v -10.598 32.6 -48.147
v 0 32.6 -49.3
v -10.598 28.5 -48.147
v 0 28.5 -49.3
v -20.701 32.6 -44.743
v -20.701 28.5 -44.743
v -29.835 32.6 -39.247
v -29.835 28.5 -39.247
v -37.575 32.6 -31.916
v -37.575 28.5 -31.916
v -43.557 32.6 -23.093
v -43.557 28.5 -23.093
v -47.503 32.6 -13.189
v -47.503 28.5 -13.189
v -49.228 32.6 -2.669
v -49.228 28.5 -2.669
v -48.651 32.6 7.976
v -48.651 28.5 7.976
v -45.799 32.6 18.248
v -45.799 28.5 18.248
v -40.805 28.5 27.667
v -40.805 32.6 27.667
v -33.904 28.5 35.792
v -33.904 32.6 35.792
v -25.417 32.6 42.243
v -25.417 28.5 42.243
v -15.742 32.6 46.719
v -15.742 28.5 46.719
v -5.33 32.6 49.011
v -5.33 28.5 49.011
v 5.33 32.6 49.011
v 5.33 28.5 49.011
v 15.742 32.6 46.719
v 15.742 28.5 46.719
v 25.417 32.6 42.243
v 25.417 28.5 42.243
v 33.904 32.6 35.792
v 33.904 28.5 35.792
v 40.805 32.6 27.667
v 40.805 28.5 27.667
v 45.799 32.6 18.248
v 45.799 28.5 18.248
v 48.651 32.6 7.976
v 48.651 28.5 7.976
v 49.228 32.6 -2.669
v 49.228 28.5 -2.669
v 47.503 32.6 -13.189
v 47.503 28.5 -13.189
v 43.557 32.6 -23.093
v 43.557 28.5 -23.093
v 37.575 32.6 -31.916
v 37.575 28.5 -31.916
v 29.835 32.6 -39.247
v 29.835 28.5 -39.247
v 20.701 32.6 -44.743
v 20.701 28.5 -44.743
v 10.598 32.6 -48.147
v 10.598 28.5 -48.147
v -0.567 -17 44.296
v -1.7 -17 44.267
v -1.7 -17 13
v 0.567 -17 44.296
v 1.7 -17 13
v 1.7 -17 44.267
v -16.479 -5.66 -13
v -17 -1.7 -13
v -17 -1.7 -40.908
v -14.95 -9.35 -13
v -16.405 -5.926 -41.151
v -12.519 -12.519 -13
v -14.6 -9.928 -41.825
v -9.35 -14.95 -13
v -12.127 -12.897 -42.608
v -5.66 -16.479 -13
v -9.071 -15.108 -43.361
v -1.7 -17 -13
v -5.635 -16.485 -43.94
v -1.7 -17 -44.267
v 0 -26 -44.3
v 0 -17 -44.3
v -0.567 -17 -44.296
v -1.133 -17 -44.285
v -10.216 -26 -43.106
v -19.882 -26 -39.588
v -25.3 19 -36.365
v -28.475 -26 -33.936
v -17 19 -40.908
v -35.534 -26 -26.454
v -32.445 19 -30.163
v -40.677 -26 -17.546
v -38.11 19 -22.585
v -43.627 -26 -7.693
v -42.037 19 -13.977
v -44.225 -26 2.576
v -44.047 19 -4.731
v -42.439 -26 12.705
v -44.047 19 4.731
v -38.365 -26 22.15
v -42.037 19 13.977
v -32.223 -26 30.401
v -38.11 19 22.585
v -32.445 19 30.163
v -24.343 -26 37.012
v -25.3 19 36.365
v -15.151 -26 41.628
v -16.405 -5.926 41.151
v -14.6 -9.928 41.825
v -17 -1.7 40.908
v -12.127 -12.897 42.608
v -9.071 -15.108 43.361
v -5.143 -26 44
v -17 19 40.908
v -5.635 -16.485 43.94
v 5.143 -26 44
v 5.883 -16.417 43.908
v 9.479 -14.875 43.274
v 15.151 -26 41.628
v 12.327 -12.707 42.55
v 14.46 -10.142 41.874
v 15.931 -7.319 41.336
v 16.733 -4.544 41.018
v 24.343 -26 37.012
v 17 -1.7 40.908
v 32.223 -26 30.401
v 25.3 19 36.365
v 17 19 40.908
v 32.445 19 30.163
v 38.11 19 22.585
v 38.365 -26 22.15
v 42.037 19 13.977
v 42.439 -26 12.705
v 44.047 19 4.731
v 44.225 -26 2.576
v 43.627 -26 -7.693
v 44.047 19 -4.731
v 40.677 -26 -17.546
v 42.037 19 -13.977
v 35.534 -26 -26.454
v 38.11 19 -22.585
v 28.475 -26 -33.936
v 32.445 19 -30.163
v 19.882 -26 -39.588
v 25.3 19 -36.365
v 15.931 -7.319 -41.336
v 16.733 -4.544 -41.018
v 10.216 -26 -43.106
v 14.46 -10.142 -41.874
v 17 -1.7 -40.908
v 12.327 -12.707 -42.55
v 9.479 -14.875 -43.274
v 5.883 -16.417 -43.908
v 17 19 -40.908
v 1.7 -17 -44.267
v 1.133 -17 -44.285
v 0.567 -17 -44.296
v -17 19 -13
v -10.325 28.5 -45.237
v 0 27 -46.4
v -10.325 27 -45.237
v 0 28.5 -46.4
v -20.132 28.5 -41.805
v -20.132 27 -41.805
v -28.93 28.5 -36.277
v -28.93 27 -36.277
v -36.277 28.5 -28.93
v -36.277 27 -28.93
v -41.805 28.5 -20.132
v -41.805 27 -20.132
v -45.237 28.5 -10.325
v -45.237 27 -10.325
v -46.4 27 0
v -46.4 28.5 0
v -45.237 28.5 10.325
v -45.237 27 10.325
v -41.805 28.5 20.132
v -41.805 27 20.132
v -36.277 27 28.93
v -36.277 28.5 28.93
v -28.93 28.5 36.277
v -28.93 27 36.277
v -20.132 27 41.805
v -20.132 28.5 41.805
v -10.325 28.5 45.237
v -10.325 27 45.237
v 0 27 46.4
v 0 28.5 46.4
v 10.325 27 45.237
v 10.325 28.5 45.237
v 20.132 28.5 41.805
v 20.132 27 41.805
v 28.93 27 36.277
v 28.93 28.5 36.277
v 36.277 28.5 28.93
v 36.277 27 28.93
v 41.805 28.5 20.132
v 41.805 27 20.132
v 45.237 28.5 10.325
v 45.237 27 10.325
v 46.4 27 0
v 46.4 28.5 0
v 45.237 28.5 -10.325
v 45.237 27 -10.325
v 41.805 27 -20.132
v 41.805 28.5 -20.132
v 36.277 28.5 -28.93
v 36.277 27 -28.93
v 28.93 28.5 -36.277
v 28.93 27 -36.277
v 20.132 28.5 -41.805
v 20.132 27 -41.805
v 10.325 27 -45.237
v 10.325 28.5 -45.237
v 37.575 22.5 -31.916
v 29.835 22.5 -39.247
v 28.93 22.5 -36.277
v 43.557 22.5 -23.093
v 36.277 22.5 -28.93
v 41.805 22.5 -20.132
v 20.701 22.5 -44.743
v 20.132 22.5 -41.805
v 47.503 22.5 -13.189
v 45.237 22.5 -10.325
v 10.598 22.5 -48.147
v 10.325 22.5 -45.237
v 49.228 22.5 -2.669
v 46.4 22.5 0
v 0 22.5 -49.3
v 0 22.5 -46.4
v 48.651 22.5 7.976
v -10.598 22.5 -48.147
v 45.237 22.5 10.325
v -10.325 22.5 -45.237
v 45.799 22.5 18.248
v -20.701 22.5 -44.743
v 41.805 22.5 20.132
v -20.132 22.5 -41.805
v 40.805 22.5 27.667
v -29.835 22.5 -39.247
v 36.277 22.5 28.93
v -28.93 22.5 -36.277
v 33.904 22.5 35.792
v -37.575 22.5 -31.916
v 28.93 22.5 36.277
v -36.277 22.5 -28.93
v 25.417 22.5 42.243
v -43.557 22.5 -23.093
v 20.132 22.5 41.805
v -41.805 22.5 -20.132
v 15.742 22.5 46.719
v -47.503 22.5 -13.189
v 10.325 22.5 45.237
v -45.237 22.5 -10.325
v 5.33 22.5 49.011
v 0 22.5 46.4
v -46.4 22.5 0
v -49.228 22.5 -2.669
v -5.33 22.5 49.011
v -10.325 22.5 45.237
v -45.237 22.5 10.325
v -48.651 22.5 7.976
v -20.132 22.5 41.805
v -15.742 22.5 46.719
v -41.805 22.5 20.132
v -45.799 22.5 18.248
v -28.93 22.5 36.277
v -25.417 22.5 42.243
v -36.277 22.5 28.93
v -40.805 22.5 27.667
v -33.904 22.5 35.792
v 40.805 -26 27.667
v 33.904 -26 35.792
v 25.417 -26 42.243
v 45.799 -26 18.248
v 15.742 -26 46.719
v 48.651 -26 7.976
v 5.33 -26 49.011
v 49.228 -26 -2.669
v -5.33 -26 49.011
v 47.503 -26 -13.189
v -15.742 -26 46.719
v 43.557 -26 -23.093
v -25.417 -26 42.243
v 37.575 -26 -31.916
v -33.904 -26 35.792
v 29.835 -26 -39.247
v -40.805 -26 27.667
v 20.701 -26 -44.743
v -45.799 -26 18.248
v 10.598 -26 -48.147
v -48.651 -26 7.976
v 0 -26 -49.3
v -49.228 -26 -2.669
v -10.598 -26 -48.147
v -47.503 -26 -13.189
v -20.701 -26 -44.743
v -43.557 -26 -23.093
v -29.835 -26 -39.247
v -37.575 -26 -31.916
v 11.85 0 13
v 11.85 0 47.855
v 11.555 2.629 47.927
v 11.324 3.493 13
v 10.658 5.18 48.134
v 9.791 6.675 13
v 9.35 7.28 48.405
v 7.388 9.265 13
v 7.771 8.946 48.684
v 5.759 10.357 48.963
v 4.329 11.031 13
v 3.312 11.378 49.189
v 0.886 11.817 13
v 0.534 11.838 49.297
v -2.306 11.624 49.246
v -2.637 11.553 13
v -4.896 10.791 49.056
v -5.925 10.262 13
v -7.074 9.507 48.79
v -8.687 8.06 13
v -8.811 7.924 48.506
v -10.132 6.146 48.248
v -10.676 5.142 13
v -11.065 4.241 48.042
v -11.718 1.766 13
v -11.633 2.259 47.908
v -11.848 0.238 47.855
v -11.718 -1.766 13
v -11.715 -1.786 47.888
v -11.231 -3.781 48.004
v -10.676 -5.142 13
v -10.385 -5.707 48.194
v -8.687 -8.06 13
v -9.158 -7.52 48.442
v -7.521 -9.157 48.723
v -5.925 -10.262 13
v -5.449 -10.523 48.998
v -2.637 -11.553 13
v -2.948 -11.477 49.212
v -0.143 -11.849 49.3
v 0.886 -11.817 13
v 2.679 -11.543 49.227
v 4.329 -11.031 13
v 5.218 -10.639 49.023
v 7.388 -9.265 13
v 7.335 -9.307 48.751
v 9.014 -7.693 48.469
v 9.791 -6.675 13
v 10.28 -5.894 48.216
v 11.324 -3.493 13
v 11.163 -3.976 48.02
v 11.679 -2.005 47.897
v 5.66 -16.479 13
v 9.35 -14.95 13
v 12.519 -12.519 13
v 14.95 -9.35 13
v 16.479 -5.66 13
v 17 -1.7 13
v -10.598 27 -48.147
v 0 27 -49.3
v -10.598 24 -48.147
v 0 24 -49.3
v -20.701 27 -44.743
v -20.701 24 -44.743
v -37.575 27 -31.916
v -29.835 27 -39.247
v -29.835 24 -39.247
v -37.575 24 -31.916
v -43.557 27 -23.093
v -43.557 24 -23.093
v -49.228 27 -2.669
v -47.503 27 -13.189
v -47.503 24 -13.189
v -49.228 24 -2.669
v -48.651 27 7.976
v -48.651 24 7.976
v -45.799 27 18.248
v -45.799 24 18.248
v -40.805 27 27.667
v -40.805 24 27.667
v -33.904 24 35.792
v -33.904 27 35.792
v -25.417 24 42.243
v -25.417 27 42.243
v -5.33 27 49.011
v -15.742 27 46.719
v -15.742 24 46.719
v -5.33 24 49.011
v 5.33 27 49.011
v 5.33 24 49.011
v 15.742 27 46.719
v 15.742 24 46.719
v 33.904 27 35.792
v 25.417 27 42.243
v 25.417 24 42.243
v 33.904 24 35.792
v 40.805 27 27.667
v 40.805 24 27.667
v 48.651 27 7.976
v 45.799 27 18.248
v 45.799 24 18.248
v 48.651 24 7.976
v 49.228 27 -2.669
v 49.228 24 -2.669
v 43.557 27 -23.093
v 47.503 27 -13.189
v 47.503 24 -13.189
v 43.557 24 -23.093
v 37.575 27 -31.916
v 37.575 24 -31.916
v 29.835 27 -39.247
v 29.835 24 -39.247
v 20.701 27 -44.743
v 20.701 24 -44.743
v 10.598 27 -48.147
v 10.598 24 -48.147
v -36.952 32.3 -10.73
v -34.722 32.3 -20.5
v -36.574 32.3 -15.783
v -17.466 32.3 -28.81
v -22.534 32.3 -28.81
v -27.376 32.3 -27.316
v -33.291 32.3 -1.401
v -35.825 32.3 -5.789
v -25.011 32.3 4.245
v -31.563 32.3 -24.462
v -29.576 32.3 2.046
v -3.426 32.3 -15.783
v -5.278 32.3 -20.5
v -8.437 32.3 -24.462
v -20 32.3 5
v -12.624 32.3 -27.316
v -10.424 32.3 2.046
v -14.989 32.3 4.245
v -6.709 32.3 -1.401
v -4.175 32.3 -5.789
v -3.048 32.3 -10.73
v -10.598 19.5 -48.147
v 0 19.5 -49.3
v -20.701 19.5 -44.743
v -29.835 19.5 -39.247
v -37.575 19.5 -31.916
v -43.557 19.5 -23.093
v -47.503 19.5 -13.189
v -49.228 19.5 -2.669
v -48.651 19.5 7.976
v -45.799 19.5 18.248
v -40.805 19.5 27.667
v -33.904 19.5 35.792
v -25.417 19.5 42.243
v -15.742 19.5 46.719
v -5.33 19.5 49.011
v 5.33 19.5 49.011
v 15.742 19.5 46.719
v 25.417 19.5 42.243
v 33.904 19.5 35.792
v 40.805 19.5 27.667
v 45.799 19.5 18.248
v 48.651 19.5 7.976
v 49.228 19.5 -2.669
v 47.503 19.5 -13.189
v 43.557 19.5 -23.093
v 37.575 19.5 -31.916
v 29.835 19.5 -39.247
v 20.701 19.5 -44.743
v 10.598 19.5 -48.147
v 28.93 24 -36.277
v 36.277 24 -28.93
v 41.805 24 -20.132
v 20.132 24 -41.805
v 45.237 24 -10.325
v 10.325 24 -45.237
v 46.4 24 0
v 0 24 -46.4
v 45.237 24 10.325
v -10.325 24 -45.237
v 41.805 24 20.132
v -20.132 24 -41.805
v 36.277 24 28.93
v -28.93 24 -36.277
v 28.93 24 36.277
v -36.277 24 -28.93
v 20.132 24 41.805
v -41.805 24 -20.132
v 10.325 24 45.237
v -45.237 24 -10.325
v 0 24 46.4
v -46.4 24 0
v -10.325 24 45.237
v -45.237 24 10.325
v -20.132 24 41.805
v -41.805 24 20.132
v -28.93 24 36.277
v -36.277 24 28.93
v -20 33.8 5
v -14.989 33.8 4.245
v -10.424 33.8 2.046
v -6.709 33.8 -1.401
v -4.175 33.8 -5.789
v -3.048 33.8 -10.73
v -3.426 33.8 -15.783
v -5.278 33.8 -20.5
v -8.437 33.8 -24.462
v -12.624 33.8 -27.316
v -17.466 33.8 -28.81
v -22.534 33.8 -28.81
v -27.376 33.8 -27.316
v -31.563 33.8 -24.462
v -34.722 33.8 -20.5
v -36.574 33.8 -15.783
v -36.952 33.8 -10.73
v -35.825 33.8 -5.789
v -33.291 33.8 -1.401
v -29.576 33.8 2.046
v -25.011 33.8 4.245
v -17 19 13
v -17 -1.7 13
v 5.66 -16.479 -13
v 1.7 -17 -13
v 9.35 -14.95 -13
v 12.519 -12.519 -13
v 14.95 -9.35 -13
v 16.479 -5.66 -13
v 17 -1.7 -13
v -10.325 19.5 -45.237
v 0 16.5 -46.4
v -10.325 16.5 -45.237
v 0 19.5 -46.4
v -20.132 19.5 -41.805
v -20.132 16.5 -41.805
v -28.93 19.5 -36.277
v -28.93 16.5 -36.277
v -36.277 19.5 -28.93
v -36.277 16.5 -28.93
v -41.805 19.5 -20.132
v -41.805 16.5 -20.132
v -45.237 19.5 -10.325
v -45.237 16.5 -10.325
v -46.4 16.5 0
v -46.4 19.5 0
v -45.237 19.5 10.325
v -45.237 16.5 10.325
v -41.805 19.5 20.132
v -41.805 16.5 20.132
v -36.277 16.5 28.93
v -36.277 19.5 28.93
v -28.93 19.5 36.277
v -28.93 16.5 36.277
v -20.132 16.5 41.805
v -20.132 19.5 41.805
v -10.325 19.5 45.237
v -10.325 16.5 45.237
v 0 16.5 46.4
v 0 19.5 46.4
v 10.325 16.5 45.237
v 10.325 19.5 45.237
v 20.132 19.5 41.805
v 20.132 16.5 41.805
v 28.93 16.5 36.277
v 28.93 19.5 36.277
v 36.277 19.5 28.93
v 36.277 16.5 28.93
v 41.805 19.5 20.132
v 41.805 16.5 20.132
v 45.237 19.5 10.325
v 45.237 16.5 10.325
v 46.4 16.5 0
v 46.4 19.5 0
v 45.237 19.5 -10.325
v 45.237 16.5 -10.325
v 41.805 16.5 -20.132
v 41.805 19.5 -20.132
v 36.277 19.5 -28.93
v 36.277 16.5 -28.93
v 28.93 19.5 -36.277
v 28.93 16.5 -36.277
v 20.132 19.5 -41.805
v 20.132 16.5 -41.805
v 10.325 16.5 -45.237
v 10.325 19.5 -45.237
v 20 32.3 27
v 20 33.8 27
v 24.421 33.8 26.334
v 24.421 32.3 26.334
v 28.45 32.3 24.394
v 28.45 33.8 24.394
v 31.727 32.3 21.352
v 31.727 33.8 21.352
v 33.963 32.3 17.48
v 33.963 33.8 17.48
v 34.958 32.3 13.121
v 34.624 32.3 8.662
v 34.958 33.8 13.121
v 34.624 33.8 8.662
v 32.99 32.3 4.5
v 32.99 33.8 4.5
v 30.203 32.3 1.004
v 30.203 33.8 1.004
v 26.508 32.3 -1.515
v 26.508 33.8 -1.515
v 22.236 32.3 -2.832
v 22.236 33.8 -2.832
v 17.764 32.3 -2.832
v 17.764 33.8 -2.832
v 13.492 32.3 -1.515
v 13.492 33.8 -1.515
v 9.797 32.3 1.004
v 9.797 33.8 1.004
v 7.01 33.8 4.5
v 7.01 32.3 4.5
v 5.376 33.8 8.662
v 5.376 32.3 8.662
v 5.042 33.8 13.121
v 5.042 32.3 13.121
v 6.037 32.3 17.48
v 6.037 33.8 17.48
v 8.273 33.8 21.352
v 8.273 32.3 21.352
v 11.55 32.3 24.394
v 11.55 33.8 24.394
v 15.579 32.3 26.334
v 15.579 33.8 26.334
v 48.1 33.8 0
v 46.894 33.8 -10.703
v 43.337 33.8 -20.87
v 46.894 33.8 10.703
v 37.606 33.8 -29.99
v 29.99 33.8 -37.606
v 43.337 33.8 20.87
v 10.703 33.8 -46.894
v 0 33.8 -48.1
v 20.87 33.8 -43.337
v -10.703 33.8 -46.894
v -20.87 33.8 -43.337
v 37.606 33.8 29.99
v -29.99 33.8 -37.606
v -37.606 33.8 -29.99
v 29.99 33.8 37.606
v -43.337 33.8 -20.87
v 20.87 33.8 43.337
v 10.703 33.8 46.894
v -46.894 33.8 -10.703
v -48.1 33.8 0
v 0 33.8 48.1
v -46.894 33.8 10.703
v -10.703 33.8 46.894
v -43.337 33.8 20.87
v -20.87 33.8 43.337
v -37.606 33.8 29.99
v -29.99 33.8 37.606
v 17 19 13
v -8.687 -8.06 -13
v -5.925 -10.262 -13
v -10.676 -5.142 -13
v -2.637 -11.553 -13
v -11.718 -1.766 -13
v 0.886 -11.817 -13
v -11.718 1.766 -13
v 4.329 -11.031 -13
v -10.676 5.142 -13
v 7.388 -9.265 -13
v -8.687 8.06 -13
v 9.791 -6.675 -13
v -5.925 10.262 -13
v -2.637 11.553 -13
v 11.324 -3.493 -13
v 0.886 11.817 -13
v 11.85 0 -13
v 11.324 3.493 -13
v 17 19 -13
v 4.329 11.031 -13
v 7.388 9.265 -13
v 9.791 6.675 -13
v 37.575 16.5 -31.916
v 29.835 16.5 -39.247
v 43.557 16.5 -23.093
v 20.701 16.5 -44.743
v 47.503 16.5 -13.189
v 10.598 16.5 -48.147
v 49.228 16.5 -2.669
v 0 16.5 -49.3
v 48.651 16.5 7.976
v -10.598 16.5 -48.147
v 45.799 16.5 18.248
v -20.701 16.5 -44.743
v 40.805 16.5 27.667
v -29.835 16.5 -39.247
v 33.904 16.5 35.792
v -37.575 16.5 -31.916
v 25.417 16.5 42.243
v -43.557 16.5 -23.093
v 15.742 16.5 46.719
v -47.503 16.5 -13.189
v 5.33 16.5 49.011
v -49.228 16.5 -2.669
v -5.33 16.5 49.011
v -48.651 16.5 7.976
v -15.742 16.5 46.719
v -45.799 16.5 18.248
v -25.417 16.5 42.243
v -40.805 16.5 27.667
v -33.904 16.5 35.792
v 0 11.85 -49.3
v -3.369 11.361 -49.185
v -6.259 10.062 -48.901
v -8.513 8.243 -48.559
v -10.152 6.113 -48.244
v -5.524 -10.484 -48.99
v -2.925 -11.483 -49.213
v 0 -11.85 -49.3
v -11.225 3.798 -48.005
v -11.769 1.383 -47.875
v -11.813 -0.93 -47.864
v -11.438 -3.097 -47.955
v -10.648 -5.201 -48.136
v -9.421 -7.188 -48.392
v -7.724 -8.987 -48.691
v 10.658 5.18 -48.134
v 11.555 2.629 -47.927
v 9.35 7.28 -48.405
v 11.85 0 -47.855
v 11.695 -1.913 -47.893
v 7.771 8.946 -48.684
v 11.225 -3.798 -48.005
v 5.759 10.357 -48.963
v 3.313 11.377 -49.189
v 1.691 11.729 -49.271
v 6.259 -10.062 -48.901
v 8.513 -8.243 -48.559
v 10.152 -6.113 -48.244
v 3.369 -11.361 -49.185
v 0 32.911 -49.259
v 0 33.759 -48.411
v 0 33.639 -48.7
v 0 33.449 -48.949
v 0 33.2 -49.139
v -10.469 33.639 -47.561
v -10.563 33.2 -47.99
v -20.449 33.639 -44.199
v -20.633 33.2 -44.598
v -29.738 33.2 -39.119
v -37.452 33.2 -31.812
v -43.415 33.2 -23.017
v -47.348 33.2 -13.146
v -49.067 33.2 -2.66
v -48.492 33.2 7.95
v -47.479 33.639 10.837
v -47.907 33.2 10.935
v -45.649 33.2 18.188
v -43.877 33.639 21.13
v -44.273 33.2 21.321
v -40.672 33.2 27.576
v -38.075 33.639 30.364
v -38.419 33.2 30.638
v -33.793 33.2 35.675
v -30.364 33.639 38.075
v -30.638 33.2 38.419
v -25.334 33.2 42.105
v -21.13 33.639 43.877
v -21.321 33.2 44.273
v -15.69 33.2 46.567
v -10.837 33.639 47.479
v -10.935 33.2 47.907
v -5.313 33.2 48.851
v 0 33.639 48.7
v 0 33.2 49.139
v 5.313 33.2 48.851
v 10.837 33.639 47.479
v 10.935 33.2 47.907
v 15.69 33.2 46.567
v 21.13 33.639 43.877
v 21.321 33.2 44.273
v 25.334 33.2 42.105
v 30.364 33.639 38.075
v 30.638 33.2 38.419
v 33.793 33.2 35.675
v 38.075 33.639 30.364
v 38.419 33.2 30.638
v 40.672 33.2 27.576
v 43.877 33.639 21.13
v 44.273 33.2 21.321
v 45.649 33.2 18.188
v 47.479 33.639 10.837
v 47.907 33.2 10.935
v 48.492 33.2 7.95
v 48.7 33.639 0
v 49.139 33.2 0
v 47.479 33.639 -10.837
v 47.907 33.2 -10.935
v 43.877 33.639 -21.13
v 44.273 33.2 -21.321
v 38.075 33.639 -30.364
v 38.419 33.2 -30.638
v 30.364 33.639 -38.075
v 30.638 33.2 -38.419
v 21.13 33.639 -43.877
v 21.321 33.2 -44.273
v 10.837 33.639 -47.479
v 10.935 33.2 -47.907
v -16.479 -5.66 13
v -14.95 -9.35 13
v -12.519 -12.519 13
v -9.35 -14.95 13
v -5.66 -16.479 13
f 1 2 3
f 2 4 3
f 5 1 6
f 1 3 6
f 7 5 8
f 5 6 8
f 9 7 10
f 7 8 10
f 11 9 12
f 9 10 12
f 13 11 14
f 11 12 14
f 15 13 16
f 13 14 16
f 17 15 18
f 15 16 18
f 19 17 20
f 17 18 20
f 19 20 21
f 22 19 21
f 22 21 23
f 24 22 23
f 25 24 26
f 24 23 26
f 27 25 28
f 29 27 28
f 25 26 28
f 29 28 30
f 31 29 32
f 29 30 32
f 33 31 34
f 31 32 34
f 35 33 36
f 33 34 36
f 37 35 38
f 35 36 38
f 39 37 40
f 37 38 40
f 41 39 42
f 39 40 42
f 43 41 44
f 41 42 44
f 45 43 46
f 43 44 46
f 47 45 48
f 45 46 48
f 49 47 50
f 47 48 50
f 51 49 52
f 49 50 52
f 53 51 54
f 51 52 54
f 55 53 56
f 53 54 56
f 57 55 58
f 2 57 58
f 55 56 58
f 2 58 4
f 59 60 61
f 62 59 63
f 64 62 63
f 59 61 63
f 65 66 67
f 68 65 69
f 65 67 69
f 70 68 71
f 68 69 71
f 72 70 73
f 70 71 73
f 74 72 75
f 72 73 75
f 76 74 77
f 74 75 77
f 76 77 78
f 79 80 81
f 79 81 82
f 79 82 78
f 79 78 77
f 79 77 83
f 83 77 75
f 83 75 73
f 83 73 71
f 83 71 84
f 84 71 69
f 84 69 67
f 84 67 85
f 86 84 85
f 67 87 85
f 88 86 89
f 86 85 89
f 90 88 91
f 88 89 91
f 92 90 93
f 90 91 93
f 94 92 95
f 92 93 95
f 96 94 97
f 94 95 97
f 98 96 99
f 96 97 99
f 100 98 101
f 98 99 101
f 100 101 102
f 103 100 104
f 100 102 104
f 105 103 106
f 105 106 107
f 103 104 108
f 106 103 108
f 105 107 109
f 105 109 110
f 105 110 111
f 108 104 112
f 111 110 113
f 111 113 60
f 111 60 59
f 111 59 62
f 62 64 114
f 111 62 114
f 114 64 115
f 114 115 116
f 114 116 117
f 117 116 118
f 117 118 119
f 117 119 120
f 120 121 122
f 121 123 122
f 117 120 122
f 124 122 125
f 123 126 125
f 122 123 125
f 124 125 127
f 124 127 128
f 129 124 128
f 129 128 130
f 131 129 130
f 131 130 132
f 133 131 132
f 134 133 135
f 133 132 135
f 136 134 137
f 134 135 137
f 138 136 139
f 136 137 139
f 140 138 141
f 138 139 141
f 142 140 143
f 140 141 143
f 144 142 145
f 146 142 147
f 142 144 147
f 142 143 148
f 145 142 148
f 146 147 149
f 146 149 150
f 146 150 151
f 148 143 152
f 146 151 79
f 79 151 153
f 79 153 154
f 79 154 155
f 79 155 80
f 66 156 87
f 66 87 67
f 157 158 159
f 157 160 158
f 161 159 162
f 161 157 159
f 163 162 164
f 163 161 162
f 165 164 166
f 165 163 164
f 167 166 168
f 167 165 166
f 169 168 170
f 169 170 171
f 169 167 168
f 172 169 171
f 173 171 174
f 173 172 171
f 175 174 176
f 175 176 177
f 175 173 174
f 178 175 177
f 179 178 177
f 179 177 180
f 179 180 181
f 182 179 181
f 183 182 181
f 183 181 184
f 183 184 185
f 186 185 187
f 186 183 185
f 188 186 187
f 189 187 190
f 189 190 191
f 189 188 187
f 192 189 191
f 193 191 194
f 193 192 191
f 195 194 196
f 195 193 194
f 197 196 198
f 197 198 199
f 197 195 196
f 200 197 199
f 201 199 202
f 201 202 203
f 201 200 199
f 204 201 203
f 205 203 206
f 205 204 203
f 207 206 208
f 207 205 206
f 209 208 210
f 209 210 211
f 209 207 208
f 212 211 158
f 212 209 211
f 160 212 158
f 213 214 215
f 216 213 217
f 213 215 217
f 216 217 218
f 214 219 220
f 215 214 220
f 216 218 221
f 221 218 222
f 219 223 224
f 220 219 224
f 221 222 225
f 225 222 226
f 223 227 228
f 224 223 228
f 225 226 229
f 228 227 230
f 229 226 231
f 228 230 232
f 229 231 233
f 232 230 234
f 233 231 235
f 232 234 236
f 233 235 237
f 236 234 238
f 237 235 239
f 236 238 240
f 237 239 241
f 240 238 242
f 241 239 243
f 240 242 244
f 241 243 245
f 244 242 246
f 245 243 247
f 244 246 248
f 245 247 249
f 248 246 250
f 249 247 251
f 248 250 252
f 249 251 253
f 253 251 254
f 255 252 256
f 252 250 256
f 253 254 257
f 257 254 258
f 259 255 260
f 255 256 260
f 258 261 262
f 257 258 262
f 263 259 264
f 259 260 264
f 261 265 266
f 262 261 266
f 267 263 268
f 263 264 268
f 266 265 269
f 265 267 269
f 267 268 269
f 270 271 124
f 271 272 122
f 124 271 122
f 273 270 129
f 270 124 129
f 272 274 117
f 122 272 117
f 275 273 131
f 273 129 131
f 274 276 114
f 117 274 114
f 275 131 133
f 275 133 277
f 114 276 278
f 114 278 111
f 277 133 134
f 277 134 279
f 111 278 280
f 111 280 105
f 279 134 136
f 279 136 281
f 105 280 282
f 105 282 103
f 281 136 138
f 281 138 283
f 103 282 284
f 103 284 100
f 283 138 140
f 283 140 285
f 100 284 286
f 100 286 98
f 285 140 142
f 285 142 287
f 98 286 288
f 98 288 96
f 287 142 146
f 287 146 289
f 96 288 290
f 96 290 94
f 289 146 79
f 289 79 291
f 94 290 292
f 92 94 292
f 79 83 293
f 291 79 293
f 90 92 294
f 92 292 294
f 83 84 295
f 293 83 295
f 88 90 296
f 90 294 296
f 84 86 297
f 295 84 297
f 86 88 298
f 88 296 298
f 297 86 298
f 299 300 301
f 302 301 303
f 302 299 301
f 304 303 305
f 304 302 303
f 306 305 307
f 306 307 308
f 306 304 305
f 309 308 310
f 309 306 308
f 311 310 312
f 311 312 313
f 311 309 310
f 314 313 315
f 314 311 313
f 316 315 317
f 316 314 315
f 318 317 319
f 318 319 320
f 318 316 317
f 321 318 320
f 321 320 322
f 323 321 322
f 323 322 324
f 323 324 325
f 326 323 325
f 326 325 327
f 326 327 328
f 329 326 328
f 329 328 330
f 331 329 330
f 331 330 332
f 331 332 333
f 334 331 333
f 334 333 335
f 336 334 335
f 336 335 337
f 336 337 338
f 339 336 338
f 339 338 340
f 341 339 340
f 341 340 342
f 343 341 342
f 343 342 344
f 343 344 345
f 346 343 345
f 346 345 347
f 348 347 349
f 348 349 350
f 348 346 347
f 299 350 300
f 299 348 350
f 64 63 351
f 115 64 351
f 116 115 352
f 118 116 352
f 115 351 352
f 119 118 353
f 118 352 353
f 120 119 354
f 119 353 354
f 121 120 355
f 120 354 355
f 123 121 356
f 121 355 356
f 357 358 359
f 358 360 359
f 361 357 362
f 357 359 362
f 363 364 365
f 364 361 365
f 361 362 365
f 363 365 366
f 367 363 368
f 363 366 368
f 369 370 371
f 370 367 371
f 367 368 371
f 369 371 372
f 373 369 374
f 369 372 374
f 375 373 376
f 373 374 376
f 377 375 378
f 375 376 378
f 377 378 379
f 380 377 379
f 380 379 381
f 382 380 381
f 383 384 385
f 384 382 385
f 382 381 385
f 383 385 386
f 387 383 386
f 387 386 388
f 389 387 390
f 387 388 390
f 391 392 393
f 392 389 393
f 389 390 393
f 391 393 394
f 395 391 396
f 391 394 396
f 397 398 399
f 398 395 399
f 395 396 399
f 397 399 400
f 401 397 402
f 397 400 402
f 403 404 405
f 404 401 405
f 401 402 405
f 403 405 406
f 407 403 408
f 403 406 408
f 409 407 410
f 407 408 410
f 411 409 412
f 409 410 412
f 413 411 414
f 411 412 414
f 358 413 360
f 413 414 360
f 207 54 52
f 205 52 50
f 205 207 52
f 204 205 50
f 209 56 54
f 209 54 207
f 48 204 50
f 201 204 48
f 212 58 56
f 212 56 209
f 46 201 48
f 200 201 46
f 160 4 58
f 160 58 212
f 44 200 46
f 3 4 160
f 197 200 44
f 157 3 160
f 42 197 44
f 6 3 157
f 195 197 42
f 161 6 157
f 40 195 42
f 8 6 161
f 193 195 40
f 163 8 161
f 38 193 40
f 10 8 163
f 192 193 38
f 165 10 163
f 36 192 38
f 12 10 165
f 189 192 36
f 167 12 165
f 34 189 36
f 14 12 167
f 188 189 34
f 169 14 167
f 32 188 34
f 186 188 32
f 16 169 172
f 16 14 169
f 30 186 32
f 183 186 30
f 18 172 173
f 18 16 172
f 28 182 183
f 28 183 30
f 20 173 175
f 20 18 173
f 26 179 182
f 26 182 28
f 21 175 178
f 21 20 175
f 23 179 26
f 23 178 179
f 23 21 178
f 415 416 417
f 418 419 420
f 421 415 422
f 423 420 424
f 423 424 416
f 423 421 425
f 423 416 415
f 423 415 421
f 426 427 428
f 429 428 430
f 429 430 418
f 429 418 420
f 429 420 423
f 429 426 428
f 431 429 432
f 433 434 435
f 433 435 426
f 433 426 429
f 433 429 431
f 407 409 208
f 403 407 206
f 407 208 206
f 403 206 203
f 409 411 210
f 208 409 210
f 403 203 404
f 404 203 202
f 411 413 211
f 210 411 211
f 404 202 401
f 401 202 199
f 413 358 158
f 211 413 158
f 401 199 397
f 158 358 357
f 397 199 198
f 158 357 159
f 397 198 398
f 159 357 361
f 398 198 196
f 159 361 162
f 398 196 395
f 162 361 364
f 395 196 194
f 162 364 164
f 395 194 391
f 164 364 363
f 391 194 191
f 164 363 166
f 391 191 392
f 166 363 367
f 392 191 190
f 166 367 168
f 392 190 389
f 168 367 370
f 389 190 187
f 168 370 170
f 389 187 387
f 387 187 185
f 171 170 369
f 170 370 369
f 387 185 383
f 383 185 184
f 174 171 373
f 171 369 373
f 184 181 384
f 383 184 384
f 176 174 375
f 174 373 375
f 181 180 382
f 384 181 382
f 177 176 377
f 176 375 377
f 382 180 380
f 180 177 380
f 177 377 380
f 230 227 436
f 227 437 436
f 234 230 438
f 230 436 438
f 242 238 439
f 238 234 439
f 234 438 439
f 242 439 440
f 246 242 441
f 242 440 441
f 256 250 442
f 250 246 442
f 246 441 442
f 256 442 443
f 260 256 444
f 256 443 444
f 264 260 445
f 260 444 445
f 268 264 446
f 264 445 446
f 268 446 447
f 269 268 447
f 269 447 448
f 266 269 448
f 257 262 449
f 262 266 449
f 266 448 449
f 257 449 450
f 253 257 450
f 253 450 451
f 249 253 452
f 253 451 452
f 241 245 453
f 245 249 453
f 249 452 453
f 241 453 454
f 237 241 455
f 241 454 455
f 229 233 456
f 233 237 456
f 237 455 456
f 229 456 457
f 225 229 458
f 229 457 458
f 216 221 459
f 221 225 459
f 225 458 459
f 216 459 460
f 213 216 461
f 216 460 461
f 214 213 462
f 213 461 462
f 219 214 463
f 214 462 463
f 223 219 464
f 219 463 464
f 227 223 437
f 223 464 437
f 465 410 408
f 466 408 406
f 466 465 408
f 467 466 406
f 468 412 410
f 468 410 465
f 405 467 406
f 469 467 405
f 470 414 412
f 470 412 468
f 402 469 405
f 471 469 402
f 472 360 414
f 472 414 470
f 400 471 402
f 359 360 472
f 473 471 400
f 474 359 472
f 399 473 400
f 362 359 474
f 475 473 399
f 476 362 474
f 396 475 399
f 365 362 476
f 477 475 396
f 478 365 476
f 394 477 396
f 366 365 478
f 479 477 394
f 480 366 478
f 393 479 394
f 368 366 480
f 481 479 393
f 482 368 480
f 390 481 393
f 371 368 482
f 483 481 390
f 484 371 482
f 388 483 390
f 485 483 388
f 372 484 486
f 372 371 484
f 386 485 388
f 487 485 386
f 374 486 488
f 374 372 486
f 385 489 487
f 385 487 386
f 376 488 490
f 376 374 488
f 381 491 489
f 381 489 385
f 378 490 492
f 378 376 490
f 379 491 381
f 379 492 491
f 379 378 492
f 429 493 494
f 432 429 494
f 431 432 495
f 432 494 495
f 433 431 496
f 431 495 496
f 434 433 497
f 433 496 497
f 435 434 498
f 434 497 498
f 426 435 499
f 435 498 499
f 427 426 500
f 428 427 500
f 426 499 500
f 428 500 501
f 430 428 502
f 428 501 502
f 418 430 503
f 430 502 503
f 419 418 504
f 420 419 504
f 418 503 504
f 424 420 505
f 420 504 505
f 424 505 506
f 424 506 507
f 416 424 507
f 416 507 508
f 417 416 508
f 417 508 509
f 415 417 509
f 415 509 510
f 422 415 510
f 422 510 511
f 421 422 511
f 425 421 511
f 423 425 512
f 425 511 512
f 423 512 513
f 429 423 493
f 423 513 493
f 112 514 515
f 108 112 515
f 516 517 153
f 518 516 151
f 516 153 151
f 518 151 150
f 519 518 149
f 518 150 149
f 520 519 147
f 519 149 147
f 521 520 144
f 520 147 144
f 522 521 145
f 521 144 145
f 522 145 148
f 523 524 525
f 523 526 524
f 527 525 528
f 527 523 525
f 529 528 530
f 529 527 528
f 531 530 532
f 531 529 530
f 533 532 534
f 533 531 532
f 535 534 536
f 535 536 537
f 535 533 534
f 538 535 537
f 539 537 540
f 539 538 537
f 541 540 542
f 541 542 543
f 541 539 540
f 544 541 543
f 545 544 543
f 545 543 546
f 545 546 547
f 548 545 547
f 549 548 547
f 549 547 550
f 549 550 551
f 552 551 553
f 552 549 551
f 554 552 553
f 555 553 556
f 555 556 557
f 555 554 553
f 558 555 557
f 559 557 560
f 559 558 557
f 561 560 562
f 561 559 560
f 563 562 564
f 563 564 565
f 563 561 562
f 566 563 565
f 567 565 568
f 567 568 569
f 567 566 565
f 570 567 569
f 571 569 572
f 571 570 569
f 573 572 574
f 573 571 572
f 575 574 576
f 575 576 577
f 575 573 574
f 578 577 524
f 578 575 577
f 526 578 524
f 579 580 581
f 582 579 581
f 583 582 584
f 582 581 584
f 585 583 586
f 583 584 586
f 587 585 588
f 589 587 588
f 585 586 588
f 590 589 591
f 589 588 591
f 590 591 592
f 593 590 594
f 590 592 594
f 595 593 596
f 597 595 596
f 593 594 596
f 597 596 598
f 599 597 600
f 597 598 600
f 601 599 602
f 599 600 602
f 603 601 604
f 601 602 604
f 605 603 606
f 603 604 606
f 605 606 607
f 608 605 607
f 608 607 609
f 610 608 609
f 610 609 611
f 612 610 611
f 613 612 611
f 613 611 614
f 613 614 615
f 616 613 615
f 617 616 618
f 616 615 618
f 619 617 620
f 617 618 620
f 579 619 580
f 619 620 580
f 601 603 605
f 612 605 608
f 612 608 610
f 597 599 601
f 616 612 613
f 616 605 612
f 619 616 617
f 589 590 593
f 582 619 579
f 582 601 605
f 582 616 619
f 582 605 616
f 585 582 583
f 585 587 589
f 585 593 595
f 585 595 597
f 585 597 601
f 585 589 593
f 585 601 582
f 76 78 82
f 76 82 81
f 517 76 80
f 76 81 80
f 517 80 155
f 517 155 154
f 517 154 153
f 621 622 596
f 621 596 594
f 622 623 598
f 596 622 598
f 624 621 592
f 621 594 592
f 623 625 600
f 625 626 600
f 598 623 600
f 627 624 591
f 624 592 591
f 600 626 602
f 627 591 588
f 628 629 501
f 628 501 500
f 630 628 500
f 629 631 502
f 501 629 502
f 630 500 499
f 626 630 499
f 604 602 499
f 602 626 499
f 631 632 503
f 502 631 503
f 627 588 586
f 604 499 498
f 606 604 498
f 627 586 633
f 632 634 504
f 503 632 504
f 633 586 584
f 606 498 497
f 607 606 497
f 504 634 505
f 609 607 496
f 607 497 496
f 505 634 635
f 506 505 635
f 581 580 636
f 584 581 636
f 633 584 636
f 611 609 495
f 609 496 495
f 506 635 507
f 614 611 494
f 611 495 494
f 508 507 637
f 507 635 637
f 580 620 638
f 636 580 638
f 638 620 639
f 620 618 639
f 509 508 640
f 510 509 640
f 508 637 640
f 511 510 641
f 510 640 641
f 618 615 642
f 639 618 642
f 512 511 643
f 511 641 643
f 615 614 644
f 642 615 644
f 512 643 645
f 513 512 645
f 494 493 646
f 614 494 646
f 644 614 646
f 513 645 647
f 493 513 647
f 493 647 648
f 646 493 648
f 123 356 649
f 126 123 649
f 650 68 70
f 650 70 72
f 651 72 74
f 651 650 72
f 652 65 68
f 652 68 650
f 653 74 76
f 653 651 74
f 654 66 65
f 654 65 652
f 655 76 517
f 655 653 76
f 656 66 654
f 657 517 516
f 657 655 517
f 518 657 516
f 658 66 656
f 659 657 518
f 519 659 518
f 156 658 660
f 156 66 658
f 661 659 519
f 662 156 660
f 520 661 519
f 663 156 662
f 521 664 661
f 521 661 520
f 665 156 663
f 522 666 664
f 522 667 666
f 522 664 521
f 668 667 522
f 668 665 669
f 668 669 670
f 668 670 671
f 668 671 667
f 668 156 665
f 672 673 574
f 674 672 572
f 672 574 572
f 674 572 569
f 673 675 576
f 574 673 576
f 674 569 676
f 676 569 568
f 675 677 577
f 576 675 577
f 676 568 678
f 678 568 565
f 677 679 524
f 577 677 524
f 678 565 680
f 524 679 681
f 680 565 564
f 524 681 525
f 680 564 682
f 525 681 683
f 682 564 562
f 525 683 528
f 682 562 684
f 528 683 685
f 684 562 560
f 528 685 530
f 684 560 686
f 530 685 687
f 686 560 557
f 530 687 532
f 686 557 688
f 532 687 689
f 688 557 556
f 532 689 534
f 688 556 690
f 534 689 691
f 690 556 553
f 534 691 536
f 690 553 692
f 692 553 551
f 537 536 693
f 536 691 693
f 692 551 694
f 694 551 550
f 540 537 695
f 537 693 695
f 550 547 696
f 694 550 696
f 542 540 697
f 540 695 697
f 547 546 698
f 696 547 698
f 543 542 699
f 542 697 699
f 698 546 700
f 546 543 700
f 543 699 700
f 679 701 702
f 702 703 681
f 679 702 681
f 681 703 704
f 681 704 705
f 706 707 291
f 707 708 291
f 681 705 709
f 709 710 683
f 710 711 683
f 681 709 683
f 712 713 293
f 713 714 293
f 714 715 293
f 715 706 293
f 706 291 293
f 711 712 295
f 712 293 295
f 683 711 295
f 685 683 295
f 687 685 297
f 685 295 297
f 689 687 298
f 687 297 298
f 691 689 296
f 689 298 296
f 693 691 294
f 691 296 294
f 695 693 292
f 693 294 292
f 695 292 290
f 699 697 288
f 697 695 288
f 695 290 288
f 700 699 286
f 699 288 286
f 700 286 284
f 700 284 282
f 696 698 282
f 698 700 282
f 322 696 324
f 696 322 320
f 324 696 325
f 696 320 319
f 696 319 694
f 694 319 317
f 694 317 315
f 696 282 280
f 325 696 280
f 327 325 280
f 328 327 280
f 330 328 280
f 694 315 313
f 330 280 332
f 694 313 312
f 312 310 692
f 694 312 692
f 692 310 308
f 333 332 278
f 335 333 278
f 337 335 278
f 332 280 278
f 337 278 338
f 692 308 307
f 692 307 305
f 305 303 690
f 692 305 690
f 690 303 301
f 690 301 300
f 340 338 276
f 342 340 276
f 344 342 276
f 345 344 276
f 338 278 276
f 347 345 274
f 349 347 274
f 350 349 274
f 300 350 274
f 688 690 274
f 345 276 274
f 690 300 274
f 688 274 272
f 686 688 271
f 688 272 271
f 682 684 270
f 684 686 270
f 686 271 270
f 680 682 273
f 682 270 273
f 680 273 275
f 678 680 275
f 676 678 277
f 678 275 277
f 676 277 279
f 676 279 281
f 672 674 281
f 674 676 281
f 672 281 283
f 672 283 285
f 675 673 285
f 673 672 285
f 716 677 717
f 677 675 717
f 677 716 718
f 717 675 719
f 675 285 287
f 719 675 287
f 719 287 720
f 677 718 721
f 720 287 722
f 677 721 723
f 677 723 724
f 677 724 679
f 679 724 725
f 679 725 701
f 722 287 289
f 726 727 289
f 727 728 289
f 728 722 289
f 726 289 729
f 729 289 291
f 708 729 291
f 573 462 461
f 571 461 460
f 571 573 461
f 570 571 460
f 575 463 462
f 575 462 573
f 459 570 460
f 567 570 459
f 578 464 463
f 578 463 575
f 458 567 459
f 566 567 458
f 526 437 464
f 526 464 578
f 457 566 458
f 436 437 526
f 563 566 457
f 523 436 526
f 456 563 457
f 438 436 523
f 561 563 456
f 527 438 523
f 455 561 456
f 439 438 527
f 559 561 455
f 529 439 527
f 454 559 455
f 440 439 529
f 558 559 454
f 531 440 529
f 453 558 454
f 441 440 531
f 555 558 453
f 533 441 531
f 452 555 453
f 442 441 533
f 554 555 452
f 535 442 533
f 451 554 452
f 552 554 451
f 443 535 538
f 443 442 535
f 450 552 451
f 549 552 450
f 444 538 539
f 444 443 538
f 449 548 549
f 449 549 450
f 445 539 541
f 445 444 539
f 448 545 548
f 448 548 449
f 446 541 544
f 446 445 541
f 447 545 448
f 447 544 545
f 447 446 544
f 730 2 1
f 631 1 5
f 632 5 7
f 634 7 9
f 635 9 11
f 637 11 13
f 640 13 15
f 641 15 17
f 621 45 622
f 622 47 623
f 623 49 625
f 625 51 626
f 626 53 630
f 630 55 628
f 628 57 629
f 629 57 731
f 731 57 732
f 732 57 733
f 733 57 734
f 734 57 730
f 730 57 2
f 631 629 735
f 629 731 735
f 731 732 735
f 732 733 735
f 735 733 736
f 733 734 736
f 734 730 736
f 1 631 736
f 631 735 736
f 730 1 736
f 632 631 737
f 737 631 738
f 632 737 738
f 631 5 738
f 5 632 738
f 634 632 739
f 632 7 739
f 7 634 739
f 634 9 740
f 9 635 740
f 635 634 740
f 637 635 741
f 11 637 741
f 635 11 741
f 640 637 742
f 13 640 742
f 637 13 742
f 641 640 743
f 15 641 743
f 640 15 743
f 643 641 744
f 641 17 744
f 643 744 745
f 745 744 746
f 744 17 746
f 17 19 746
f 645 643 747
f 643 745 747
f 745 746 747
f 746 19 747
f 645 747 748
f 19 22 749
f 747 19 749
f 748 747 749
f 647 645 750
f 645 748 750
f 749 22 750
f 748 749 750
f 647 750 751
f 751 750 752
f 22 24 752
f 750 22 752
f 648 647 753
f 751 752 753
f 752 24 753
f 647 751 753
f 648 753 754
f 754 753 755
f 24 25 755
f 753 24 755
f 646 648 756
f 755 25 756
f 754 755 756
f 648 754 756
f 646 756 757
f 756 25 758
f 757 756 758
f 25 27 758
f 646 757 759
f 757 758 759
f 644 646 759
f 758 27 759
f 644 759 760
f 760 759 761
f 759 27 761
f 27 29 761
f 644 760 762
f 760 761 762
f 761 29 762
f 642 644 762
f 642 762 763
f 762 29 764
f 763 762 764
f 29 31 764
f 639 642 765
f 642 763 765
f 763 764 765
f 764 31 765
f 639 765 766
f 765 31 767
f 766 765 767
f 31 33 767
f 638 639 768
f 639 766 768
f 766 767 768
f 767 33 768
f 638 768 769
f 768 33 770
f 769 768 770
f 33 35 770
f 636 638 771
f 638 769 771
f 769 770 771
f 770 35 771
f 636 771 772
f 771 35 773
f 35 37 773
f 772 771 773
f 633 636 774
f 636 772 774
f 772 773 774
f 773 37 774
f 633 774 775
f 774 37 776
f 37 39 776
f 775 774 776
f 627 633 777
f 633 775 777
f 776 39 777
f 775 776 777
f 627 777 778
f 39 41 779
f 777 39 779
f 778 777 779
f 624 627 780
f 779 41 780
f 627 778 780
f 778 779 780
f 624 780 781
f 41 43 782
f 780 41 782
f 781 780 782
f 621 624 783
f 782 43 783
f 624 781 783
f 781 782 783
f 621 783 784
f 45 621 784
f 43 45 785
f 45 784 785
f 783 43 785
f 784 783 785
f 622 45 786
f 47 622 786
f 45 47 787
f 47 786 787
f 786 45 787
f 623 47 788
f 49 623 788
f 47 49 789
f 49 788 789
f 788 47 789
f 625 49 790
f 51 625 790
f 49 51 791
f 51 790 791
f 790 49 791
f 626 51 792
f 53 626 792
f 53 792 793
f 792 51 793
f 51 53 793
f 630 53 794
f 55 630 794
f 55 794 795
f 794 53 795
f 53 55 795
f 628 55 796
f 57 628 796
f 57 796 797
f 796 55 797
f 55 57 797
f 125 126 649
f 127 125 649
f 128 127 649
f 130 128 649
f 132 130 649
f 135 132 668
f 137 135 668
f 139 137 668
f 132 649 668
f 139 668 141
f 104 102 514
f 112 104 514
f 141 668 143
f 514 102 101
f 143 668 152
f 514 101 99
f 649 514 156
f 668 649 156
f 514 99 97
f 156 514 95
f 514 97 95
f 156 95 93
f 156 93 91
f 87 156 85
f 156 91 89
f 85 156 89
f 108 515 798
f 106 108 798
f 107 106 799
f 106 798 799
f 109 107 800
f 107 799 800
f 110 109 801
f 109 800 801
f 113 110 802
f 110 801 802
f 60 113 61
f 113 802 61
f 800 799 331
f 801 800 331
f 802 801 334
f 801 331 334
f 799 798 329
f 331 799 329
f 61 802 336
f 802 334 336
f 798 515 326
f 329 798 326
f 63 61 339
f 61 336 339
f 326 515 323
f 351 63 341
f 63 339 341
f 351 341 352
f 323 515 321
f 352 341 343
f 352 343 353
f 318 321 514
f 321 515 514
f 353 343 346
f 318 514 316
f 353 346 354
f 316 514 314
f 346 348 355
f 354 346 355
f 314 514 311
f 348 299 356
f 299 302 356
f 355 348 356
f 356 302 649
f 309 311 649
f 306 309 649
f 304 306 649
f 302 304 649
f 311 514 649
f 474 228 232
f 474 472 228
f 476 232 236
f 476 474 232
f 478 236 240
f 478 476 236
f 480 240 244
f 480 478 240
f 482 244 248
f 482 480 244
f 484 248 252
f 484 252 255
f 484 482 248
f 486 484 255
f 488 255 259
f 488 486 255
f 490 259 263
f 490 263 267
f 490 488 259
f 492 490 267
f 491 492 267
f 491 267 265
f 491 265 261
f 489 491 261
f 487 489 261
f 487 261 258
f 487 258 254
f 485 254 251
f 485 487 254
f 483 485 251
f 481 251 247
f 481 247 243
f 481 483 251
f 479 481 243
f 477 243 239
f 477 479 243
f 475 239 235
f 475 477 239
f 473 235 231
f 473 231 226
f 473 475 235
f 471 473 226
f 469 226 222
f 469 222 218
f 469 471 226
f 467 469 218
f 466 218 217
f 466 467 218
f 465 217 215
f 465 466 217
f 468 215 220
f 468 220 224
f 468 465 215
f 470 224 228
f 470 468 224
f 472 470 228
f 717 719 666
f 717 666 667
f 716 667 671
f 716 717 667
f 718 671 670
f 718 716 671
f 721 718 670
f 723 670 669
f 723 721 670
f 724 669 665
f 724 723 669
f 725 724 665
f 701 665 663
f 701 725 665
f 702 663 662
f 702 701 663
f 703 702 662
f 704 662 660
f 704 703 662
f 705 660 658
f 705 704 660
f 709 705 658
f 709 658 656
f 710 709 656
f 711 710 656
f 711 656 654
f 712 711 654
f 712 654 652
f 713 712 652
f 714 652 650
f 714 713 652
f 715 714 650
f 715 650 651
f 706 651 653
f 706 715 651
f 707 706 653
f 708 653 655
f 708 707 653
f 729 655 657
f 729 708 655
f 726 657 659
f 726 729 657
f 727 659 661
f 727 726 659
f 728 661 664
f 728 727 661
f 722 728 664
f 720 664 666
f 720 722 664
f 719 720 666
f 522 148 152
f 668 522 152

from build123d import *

# Parameters (mm, degrees)
PIN_START            = 13
PIN_BOSS_FRONT_DEPTH = 31.5
PIN_START_2          = -44.5
PIN_BOSS_REAR_DEPTH  = 31.5
PIN_BORE_DEPTH       = 78.481739955
PIN_BORE_DEPTH_BACK  = 78.481739955
SKETCH4_R            = 11.85
SKETCH5_W            = 4.1
SKETCH5_H            = 1.5
SKETCH5_H_2          = 3
SKETCH6_R            = 17
SKETCH6_R_2          = 15
VALVE_RELIEFS_DEPTH  = 1.5


with BuildPart() as part:
    # Sketch1 → Piston Body (revolve)
    with BuildSketch(Plane.XY):
        with BuildLine():
            Line((0, 33.8), (48.1, 33.8))
            ThreePointArc((48.1, 33.8), (48.948528137, 33.448528137), (49.3, 32.6))
            Line((49.3, 32.6), (49.3, -26))
            Line((49.3, -26), (44.3, -26))
            Line((44.3, -26), (44.3, 19))
            Line((44.3, 19), (0, 19))
            Line((0, 19), (0, 33.8))
        make_face()
    revolve(axis=Axis((0, -60, 0), (0, 1, 0)))

    # Sketch2 → Pin Boss Front (add)
    with BuildSketch(Plane.XY.offset(PIN_START)):
        with BuildLine():
            Line((-17, 19.5), (-17, -1.7))
            ThreePointArc((-17, -1.7), (-12.518733752, -12.518733752), (-1.7, -17))
            Line((-1.7, -17), (1.7, -17))
            ThreePointArc((1.7, -17), (12.518733752, -12.518733752), (17, -1.7))
            Line((17, -1.7), (17, 19.5))
            Line((17, 19.5), (-17, 19.5))
        make_face()
    extrude(amount=PIN_BOSS_FRONT_DEPTH)

    # Sketch3 → Pin Boss Rear (add)
    with BuildSketch(Plane.XY.offset(PIN_START_2)):
        with BuildLine():
            Line((-17, 19.5), (-17, -1.7))
            ThreePointArc((-17, -1.7), (-12.518733752, -12.518733752), (-1.7, -17))
            Line((-1.7, -17), (1.7, -17))
            ThreePointArc((1.7, -17), (12.518733752, -12.518733752), (17, -1.7))
            Line((17, -1.7), (17, 19.5))
            Line((17, 19.5), (-17, 19.5))
        make_face()
    extrude(amount=PIN_BOSS_REAR_DEPTH)

    # Sketch4 → Pin Bore (cut, two sides: drawn at the far end of the back side and taken through both)
    with BuildSketch(Plane.XY.offset(-PIN_BORE_DEPTH_BACK)):
        Circle(SKETCH4_R)
    extrude(amount=PIN_BORE_DEPTH + PIN_BORE_DEPTH_BACK, mode=Mode.SUBTRACT)

    # Sketch5 → Ring Grooves (revolve, cut)
    with BuildSketch(Plane.XY):
        with Locations((48.45, 27.75)):
            Rectangle(SKETCH5_W, SKETCH5_H)
        with Locations((48.45, 23.25)):
            Rectangle(SKETCH5_W, SKETCH5_H)
        with Locations((48.45, 18)):
            Rectangle(SKETCH5_W, SKETCH5_H_2)
    revolve(axis=Axis((0, -60, 0), (0, 1, 0)), mode=Mode.SUBTRACT)

    # Sketch6 → Valve Reliefs (cut)
    with BuildSketch(Plane(origin=(0, 33.8, 0), x_dir=(1, 0, 0), z_dir=(0, 1, 0))):
        with Locations((-20, 12)):
            Circle(SKETCH6_R)
        with Locations((20, -12)):
            Circle(SKETCH6_R_2)
    extrude(amount=-VALVE_RELIEFS_DEPTH, mode=Mode.SUBTRACT)


solid = part.part
